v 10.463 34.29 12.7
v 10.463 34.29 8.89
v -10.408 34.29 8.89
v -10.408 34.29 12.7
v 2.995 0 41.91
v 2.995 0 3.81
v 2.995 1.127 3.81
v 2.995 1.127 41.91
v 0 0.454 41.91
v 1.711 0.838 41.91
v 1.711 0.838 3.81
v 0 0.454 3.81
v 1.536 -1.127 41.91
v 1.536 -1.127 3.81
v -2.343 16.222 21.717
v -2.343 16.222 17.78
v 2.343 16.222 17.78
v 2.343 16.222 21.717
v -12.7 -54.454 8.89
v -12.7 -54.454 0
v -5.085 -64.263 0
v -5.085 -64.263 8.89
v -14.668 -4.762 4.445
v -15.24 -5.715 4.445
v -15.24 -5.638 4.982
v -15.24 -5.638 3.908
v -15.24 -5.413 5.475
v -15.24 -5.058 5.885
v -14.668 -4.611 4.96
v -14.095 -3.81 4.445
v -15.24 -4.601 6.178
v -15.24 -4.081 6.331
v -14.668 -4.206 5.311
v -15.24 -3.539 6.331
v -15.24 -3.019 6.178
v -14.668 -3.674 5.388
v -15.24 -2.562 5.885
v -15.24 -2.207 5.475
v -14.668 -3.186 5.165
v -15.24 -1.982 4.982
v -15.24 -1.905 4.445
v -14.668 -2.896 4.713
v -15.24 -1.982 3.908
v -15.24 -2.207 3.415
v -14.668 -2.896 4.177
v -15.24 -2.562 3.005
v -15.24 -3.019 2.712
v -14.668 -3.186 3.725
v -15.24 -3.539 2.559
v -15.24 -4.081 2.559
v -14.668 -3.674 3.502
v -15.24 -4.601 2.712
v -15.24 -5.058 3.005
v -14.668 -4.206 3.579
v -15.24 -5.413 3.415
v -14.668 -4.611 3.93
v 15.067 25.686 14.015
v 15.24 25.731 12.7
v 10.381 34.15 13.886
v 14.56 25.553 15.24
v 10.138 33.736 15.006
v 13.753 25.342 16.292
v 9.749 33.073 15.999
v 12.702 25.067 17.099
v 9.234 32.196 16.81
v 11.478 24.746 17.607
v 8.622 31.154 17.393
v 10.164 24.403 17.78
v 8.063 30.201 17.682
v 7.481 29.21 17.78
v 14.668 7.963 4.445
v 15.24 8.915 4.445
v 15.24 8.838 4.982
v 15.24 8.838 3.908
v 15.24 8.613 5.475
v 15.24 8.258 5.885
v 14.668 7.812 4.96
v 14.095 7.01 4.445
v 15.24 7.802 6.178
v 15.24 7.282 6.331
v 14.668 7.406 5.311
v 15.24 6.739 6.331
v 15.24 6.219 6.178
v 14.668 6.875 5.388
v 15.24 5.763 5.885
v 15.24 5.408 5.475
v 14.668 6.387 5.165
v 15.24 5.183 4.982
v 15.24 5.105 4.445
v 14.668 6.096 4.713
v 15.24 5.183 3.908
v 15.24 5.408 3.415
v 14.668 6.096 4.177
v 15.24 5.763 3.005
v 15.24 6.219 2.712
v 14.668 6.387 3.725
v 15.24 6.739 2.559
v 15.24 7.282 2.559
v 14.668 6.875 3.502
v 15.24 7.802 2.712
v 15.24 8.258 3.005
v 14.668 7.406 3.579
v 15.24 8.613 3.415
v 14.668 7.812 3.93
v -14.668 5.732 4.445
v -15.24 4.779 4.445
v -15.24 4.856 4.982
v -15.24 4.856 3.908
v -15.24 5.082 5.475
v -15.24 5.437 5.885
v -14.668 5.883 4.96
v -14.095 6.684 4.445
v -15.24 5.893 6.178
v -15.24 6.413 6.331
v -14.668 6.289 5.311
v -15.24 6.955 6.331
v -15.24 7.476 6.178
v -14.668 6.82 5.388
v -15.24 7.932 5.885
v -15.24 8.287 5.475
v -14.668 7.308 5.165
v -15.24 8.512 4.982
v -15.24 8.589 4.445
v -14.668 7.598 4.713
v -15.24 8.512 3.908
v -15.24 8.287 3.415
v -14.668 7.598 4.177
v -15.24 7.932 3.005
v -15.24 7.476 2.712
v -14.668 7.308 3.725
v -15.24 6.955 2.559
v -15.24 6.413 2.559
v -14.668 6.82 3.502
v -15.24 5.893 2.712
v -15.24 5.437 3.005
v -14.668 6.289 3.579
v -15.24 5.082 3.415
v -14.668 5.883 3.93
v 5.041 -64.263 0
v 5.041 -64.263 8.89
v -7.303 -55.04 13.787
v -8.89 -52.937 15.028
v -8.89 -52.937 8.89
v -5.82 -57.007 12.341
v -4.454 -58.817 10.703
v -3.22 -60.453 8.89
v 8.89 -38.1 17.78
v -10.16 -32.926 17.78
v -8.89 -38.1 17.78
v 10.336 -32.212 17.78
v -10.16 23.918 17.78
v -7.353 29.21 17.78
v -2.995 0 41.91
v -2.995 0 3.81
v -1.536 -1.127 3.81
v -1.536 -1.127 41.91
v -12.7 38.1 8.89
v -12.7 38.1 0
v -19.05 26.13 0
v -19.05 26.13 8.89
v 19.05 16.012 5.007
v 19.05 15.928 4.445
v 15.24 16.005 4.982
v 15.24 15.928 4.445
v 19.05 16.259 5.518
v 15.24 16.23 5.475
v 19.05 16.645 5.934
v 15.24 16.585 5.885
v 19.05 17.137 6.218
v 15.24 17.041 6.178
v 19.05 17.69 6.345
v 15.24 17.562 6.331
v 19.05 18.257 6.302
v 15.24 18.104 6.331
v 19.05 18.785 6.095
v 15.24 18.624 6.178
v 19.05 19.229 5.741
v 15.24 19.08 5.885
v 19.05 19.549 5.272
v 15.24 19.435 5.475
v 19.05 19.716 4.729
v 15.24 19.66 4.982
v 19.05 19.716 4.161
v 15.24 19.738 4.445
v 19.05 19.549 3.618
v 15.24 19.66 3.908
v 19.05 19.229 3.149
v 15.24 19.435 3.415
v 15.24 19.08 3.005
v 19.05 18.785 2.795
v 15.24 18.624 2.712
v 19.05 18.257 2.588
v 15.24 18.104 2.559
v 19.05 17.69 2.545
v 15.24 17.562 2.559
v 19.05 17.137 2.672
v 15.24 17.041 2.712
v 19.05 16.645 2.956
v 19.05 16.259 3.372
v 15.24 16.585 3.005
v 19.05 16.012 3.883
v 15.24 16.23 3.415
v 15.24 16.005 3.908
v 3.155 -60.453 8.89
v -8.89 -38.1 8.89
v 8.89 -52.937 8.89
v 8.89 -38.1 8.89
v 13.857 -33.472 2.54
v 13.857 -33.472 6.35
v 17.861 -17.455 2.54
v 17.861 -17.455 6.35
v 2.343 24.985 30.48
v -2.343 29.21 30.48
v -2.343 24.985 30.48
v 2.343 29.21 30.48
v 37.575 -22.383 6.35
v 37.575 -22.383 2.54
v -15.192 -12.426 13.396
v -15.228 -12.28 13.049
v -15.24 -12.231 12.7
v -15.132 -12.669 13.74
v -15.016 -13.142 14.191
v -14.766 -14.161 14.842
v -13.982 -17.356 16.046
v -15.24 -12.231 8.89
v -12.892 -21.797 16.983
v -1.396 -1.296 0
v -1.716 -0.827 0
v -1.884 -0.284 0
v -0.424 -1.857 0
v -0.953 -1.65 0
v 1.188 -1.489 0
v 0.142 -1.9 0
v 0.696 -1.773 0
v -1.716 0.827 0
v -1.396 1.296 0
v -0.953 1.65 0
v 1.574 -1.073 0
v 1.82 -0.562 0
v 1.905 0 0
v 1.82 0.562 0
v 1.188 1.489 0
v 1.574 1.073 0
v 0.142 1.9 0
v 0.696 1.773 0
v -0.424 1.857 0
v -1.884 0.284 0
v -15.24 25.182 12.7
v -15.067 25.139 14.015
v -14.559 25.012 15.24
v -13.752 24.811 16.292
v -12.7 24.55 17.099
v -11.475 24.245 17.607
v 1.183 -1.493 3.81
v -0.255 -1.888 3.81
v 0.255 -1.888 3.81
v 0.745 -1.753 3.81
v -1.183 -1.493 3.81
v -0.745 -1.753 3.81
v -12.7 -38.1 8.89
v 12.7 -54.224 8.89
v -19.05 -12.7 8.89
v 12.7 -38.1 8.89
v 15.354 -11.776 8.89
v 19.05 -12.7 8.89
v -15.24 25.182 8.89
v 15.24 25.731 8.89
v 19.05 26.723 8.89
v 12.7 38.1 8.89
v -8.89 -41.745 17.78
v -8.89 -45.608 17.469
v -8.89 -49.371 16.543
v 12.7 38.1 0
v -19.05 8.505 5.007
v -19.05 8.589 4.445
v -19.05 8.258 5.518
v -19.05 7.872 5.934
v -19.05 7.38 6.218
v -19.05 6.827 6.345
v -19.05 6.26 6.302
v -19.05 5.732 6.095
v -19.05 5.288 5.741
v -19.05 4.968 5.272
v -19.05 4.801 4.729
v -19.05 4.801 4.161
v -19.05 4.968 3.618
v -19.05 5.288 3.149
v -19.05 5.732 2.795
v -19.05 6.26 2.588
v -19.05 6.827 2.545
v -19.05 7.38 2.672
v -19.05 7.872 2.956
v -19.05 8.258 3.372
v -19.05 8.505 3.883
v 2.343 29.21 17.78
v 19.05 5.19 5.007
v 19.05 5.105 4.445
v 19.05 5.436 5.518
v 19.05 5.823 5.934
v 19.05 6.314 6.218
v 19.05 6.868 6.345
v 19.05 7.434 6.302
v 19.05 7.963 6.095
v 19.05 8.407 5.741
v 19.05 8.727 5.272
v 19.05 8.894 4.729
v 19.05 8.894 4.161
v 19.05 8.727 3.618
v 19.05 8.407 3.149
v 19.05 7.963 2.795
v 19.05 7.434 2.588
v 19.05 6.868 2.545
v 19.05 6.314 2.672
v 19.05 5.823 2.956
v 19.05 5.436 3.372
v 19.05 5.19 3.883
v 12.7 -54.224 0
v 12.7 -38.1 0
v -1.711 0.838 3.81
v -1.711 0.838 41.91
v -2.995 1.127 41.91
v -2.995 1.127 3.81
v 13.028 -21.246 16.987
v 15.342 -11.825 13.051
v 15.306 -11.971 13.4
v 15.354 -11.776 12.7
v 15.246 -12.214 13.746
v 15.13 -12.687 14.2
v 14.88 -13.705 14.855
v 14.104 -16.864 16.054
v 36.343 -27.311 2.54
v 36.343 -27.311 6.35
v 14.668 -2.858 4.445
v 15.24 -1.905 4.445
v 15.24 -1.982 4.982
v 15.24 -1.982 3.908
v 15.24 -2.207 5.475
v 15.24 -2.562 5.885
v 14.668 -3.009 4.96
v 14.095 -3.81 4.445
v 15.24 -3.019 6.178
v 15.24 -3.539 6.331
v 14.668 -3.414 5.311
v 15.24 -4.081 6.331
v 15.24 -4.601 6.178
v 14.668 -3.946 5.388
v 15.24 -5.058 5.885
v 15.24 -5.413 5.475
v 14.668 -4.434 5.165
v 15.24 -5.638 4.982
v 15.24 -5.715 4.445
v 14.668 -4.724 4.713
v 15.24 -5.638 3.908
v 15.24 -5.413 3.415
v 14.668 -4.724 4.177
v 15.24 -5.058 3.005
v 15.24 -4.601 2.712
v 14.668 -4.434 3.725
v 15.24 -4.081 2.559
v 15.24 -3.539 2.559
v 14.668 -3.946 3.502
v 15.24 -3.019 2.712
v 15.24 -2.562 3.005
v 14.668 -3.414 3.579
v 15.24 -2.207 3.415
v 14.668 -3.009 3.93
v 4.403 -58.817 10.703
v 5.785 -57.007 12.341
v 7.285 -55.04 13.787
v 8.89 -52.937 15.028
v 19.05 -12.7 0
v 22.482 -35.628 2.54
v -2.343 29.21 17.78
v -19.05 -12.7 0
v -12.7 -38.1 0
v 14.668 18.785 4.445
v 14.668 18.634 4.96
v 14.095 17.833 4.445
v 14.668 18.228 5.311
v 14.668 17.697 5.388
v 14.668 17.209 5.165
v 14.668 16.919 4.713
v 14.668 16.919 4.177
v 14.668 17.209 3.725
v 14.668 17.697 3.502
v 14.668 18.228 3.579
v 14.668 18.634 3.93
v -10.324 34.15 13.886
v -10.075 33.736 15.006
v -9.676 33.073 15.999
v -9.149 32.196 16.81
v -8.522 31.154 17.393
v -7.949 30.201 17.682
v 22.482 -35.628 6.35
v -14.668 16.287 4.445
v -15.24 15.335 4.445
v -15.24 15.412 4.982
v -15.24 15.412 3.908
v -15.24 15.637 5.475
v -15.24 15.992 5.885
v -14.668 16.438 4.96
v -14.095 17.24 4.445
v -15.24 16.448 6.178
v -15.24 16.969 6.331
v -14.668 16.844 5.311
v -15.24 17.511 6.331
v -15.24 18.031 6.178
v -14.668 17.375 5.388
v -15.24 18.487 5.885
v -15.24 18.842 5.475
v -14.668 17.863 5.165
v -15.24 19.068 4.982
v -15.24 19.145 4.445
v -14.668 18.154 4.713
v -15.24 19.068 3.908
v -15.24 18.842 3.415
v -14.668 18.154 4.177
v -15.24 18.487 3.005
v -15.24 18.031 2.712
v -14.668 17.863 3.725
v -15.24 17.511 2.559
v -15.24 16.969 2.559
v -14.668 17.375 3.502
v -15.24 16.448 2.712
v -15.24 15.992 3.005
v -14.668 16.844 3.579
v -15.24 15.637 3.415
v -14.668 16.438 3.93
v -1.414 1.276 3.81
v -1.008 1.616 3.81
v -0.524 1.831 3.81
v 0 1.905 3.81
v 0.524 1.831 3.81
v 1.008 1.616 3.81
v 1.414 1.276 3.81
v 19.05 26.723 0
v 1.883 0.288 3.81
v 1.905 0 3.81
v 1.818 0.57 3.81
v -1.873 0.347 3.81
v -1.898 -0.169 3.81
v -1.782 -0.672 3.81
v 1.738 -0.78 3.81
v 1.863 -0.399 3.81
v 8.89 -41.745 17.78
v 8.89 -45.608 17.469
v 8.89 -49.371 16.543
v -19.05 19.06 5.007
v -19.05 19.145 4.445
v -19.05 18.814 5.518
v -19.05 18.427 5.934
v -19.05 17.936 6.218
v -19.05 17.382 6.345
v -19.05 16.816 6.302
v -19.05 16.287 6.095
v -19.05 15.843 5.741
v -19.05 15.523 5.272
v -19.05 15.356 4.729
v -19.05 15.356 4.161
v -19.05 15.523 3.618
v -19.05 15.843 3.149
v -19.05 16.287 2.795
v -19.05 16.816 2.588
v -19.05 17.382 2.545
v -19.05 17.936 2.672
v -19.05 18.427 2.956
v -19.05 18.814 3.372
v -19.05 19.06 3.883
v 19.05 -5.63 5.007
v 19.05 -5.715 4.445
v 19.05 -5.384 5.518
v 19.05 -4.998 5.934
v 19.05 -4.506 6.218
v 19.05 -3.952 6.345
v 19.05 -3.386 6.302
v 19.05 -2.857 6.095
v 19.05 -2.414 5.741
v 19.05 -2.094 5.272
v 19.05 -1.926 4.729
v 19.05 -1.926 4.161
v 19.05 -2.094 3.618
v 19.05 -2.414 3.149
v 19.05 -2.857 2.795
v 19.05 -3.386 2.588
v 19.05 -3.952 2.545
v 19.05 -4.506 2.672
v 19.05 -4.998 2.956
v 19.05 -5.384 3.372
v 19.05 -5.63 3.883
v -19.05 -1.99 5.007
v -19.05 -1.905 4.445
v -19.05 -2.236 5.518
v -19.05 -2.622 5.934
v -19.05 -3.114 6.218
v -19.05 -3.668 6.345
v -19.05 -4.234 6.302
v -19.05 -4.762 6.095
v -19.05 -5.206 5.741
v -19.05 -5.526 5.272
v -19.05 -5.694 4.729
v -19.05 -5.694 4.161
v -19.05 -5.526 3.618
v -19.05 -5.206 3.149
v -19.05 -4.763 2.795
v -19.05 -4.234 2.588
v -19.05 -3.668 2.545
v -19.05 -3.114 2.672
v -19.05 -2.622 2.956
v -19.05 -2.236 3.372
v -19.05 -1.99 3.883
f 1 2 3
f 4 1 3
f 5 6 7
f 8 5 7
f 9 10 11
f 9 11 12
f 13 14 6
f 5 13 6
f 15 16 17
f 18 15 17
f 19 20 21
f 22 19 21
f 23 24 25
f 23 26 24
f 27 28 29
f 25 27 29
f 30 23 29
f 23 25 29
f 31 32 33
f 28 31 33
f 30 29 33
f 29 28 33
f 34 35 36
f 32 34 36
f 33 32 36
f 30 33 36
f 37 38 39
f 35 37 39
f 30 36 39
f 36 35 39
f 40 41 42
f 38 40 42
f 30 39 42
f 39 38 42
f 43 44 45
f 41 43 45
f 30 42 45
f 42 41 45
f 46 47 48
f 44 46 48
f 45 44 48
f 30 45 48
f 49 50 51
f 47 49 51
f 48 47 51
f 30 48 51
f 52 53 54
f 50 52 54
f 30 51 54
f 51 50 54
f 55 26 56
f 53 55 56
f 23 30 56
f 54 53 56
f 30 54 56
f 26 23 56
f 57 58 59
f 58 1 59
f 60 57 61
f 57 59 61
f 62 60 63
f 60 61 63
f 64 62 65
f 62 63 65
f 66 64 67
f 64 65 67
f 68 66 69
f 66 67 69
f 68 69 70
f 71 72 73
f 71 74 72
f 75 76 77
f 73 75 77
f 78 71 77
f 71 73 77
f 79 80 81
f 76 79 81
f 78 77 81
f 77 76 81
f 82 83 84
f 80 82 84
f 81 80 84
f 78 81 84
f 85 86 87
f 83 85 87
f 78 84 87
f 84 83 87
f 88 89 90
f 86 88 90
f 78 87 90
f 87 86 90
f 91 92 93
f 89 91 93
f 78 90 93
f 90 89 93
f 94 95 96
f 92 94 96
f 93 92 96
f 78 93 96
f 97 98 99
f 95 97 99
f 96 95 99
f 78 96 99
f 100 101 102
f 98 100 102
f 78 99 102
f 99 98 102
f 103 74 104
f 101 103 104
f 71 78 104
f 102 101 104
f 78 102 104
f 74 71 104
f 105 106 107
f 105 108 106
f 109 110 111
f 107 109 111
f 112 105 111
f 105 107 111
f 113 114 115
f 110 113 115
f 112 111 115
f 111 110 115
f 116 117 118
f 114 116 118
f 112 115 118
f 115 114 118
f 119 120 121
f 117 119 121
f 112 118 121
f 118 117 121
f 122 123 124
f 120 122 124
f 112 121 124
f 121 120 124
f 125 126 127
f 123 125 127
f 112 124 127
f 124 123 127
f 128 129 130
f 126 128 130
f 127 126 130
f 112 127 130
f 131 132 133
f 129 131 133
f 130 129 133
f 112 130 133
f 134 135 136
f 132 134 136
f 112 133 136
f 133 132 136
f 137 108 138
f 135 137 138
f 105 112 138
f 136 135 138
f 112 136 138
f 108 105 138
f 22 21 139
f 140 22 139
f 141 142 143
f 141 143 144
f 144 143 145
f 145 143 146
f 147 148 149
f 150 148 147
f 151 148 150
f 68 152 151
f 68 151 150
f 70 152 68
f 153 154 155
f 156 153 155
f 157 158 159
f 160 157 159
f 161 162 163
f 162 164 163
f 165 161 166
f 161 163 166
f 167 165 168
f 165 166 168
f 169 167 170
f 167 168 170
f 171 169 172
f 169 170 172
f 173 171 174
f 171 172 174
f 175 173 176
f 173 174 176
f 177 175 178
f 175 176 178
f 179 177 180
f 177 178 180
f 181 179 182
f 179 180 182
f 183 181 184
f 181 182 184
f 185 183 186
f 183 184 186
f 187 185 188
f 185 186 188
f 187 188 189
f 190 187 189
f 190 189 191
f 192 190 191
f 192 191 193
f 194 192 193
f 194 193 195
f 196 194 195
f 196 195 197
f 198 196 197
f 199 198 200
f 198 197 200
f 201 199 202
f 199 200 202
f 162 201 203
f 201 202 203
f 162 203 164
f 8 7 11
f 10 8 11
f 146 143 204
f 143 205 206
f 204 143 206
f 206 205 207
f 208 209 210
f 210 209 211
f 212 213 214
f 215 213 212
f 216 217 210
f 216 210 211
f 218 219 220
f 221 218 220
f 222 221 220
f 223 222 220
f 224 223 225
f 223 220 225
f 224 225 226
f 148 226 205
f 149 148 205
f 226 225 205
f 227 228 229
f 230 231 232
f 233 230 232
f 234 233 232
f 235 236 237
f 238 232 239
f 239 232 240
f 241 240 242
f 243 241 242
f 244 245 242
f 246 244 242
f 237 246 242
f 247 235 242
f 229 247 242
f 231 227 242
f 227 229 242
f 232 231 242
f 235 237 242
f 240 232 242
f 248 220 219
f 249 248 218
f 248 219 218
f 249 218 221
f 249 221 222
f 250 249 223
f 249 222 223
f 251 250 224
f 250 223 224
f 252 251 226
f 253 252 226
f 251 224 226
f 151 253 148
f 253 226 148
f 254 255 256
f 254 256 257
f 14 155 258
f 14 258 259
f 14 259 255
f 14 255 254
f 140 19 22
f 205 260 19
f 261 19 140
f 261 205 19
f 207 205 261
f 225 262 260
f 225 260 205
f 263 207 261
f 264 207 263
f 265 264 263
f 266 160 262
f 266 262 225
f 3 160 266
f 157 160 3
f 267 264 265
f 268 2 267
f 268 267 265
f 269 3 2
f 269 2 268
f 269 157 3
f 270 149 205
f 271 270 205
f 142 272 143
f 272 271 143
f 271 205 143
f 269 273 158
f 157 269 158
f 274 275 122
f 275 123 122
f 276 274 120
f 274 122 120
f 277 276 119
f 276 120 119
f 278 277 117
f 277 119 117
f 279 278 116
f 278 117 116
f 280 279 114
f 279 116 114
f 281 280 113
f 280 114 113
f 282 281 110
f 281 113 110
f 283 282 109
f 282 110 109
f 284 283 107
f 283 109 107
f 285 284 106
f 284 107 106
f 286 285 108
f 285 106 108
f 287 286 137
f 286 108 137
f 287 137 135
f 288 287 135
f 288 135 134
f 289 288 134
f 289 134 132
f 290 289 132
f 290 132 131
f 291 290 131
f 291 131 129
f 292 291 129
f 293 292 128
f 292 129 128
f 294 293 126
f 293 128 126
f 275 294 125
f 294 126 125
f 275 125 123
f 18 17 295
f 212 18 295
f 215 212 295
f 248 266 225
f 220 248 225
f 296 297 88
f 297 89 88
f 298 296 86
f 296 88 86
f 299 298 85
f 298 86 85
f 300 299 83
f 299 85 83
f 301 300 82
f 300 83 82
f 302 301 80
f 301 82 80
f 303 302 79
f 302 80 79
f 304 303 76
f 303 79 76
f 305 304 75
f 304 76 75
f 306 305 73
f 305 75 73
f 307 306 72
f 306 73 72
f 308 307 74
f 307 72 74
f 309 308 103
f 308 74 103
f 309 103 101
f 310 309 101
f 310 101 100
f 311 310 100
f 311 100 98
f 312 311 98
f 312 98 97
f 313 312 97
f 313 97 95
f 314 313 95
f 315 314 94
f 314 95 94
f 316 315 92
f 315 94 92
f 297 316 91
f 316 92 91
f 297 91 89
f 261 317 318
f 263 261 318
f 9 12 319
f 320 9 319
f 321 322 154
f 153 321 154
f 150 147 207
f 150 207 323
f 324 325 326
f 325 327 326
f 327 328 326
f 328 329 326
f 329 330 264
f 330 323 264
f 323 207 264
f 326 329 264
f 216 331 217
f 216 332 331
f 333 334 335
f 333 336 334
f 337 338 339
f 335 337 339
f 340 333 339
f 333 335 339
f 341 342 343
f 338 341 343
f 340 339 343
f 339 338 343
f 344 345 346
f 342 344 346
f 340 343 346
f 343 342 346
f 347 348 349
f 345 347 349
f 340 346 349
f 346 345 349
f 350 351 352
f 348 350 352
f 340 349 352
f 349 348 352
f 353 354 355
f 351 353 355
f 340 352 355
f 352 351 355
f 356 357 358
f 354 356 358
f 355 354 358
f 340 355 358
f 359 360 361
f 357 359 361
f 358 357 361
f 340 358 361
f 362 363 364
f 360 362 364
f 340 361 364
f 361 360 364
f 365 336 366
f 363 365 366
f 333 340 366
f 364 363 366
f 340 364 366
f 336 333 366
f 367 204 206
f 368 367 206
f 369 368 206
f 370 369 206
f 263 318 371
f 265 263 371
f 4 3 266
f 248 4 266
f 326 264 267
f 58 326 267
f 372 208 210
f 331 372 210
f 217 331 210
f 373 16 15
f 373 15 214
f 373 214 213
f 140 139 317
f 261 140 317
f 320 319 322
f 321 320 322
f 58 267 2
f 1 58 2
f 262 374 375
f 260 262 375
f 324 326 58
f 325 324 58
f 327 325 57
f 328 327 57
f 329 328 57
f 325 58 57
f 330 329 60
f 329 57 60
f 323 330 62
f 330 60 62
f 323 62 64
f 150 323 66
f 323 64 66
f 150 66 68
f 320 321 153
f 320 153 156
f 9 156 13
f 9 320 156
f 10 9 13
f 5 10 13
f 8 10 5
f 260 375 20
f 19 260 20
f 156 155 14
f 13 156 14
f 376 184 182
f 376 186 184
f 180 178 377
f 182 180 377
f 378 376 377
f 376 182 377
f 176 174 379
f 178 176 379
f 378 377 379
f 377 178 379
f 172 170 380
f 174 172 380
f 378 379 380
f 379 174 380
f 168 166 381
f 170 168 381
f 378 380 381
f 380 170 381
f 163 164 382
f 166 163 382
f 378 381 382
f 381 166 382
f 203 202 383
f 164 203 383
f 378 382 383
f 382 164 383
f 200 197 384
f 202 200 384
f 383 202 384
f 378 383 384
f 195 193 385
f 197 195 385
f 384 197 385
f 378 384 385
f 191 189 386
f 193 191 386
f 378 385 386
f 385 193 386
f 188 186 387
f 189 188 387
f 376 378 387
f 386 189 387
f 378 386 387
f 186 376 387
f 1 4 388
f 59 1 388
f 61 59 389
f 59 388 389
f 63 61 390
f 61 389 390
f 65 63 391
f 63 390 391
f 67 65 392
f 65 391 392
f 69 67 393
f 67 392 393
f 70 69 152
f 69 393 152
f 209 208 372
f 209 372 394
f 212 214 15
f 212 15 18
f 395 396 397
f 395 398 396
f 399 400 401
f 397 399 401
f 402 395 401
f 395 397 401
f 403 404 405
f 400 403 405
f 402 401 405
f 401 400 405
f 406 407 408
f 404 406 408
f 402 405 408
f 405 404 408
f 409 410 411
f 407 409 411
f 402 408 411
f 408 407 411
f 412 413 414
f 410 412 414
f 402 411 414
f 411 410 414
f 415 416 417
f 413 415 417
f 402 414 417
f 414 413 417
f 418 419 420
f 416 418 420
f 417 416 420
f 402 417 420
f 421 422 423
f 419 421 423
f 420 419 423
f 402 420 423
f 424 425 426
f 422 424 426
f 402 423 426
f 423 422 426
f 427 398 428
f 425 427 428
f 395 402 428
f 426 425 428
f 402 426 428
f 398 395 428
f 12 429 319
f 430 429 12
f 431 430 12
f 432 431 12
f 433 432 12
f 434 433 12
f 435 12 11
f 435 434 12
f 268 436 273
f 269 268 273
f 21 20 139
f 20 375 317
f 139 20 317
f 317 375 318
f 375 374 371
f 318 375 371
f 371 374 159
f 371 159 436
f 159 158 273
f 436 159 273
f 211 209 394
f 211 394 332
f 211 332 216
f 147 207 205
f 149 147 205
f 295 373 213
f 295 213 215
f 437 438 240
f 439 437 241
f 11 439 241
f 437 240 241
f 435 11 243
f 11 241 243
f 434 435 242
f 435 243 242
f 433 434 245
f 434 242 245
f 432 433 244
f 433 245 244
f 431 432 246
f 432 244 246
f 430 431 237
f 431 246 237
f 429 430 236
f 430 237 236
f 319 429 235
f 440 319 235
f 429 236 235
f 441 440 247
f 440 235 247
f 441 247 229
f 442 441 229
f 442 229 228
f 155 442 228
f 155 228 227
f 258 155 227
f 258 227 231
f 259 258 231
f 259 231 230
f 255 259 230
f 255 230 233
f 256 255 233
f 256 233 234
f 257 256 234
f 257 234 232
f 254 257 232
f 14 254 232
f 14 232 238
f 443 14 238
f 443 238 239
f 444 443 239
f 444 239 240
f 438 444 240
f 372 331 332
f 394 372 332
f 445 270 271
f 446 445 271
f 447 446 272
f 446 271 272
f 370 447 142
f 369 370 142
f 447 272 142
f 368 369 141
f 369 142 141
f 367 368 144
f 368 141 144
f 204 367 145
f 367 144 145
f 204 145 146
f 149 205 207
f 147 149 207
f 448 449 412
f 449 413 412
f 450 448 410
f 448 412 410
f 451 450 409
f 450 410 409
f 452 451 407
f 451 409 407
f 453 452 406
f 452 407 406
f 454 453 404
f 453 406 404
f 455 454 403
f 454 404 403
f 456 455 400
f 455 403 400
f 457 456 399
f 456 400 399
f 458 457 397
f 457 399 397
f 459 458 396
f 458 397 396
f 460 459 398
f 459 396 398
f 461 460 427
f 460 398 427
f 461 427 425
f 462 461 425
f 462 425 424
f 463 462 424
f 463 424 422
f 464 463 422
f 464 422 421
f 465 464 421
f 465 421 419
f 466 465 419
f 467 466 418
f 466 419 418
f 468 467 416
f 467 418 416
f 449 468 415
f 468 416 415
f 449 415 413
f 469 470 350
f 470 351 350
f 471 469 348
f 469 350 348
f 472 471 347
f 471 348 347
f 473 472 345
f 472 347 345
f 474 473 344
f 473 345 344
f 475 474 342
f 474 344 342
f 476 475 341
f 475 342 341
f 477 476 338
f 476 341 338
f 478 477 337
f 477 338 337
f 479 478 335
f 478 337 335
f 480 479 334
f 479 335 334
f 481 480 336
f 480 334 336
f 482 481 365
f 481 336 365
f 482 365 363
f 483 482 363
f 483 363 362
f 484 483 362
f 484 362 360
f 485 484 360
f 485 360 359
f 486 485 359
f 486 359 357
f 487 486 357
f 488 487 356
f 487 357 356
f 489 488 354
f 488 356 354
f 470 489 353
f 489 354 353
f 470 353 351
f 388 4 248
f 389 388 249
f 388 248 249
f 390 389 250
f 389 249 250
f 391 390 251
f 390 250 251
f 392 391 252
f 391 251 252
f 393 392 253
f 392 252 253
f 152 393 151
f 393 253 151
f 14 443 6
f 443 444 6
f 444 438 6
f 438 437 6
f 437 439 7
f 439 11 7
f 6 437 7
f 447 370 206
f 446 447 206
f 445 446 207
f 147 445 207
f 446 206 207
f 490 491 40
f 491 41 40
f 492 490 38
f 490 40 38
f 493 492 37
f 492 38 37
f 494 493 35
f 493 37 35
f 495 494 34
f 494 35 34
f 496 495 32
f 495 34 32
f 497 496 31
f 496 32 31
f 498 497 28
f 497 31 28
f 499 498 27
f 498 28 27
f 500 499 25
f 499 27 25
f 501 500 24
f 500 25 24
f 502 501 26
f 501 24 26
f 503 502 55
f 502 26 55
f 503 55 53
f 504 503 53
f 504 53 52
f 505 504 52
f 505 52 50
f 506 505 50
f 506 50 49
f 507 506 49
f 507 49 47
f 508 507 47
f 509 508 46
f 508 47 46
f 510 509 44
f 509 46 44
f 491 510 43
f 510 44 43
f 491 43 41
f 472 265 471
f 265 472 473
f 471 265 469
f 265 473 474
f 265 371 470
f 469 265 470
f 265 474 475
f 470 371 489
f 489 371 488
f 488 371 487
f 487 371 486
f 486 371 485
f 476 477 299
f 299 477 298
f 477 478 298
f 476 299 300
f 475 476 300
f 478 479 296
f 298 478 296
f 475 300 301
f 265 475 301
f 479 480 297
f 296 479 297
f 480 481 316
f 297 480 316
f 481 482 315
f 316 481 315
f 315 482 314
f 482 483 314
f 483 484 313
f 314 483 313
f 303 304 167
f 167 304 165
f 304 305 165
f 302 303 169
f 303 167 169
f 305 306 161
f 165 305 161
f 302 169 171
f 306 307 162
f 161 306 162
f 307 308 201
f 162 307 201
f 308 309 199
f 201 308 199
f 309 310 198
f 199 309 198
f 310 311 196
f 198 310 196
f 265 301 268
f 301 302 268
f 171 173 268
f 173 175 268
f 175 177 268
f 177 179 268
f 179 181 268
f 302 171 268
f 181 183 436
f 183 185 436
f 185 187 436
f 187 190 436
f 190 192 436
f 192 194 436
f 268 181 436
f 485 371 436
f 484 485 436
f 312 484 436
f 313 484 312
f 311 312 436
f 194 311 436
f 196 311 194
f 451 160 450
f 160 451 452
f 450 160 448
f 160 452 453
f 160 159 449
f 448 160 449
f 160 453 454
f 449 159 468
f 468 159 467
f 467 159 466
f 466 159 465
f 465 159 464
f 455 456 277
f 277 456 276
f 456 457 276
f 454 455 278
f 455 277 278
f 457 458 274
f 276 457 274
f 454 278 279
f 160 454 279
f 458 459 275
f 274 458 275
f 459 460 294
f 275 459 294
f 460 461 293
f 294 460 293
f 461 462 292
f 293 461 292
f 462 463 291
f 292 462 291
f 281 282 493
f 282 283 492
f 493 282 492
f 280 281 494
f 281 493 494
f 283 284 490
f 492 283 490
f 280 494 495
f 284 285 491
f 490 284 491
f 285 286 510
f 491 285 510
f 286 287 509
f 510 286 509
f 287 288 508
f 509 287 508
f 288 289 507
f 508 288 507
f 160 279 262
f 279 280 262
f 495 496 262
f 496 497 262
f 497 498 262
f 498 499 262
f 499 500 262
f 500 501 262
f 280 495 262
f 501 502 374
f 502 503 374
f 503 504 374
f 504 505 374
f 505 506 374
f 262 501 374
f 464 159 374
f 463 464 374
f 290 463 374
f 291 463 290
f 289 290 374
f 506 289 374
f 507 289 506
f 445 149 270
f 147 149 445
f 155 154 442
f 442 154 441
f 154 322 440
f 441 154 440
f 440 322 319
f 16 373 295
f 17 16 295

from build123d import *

# Parameters (mm, degrees)
F1_DEPTH    = 8.89
F3_DEPTH    = 8.89
F4_T1_DEPTH = 99.9162053314
F5_DEPTH    = 8.89
F6_R        = 5.08
F8_D        = 3.81
F8_DEPTH    = 3.81
F8_TIP      = 1.1446394792
F10_D       = 3.81
F10_DEPTH   = 3.81
F10_TIP     = 1.1446394792
F11_R       = 1.905
F12_DEPTH   = 3.81
F14_DEPTH   = 38.1
F15_DEPTH   = 38.1
F16_DEPTH   = 38.1
F17_W       = 4.6861195005
F17_H       = 12.987878806
F18_DEPTH   = 12.7
F19_SIZE    = 8.763
F20_W       = 16.51
F20_H       = 3.81
F21_DEPTH   = 20.32
F22_SIZE    = 11.43


# Not quite as in the source:
# - a fillet or chamfer that OpenCascade refuses, or shapes differently, is made with other operations: its cross-section is extruded or revolved along the edge and cut away or added


with BuildPart() as f1:
    # F0 (on Top) → F1 (new body)
    with BuildSketch(Plane.XY):
        Polygon((19.05, 26.7226453871), (12.7, 38.1), (-12.7, 38.1), (-19.05, 26.1296909302), (-19.05, -12.7), (-12.7, -38.1), (-12.7, -54.4537100359), (-5.0853045448, -64.2633512616), (5.0406523641, -64.2633512616), (12.7, -54.2242169015), (12.7, -38.1), (19.05, -12.7), align=None)
    extrude(amount=F1_DEPTH)

    # F2 (on face) → F5 (join)
    with BuildSketch(Plane.XY.offset(8.89)):
        Polygon((-15.24, -12.2309675664), (-8.89, -38.1), (8.89, -38.1), (15.3537570744, -11.7759392686), (15.24, 25.7313851458), (10.4632125856, 34.29), (-10.4082323758, 34.29), (-15.24, 25.1816926275), align=None)
    extrude(amount=F5_DEPTH)

    # F6
    f6_edges = [f1.edges().sort_by_distance(p)[0] for p in [
        (-15.24, 6.475363, 17.78),
        (15.296879, 6.977723, 17.78),
        (-12.824116, 29.735846, 17.78),
        (12.851606, 30.010693, 17.78),
        (0.02749, 34.29, 17.78),
    ]]
    fillet(f6_edges, radius=F6_R)

    # F8
    with Locations(Plane.YZ.offset(19.05)):
        with Locations((-3.81, 4.445), (7.0104, 4.445), (17.8326453871, 4.445)):
            Hole(F8_D / 2, depth=F8_DEPTH)
            with Locations((0, 0, -(F8_DEPTH + F8_TIP / 2))):  # 118° drill point
                Cone(0, F8_D / 2, F8_TIP, mode=Mode.SUBTRACT)

    # F10
    with Locations(Plane(origin=(-19.05, 0, 0), x_dir=(0, -1, 0), z_dir=(-1, 0, 0))):
        with Locations((-17.2396909302, 4.445), (-6.684313026, 4.445), (3.81, 4.445)):
            Hole(F10_D / 2, depth=F10_DEPTH)
            with Locations((0, 0, -(F10_DEPTH + F10_TIP / 2))):  # 118° drill point
                Cone(0, F10_D / 2, F10_TIP, mode=Mode.SUBTRACT)


with BuildPart() as f3:
    # F2 (on face) → F3 (new body)
    with BuildSketch(Plane.XY.offset(8.89)):
        Polygon((8.89, -38.1), (-8.89, -38.1), (-8.89, -52.936759997), (-3.2196400783, -60.4533512616), (-0.0223260903, -60.4533512616), (3.1552241252, -60.4533512616), (8.89, -52.936759997), align=None)
    extrude(amount=F3_DEPTH)

    # F4: fillet of radius 24.13 on 1 edges, made by hand

    # F4_s2 → F4_t1 (cut)
    with BuildSketch(Plane.YZ.offset(-49.9903106423)):
        with BuildLine():
            ThreePointArc((-41.745083036, 17.78), (-52.1016196193, 15.4444729232), (-60.4533512616, 8.89))
            Line((-60.4533512616, 8.89), (-60.4533512616, 17.78))
            Line((-60.4533512616, 17.78), (-41.745083036, 17.78))
        make_face()
    extrude(amount=F4_T1_DEPTH, mode=Mode.SUBTRACT)


with BuildPart() as f12:
    # F11 (on Top) → F12 (new body)
    with BuildSketch(Plane.XY):
        Circle(F11_R)
    extrude(amount=F12_DEPTH)

    # F13 (on face) → F14 (join)
    with BuildSketch(Plane.XY.offset(3.81)):
        with BuildLine():
            Line((0, -1.1266035726), (1.5361606004, -1.1266035726))
            ThreePointArc((1.5361606004, -1.1266035726), (1.8104434462, -0.592722134), (1.905, 0))
            ThreePointArc((1.905, 0), (1.8558119687, 0.4301010776), (1.7107879927, 0.837991315))
            Line((1.7107879927, 0.837991315), (0, 0.4536258639))
            Line((0, 0.4536258639), (-1.7107879927, 0.837991315))
            ThreePointArc((-1.7107879927, 0.837991315), (-1.8975186586, -0.1686651723), (-1.5361606004, -1.1266035726))
            Line((-1.5361606004, -1.1266035726), (0, -1.1266035726))
        make_face()
    extrude(amount=F14_DEPTH)

    # F13 (on face) → F15 (join)
    with BuildSketch(Plane.XY.offset(3.81)):
        with BuildLine():
            Line((-2.9953841586, 0), (-1.5361606004, -1.1266035726))
            ThreePointArc((-1.5361606004, -1.1266035726), (-1.8975186586, -0.1686651723), (-1.7107879927, 0.837991315))
            Line((-1.7107879927, 0.837991315), (-2.9953841586, 1.1266035726))
            Line((-2.9953841586, 1.1266035726), (-2.9953841586, 0))
        make_face()
    extrude(amount=F15_DEPTH)

    # F13 (on face) → F16 (join)
    with BuildSketch(Plane.XY.offset(3.81)):
        with BuildLine():
            ThreePointArc((1.905, 0), (1.8104434462, -0.592722134), (1.5361606004, -1.1266035726))
            Line((1.5361606004, -1.1266035726), (2.9953841586, 0))
            Line((2.9953841586, 0), (2.9953841586, 1.1266035726))
            Line((2.9953841586, 1.1266035726), (1.7107879927, 0.837991315))
            ThreePointArc((1.7107879927, 0.837991315), (1.8558119687, 0.4301010776), (1.905, 0))
        make_face()
    extrude(amount=F16_DEPTH)


with BuildPart() as f18:
    # F17 (on face) → F18 (new body)
    with BuildSketch(Plane.XY.offset(17.78)):
        with Locations((0, 22.716060597)):
            Rectangle(F17_W, F17_H)
    extrude(amount=F18_DEPTH)

    # F19
    f19_edges = [f18.edges().sort_by_distance(p)[0] for p in [
        (0, 16.222121, 30.48),
    ]]
    chamfer(f19_edges, length=F19_SIZE)


with BuildPart() as f21:
    # F20 (on face) → F21 (new body)
    with BuildSketch(Plane(origin=(20.9176470588, -5.2294117647, 0), x_dir=(0.242535625, 0.9701425001, 0), z_dir=(0.9701425001, -0.242535625, 0))):
        with Locations((-20.8566915244, 4.445)):
            Rectangle(F20_W, F20_H)
    extrude(amount=F21_DEPTH)

    # F22
    f22_edges = [f21.edges().sort_by_distance(p)[0] for p in [
        (33.57032, -38.400225, 4.445),
    ]]
    chamfer(f22_edges, length=F22_SIZE)


solid = Compound([f1.part, f3.part, f12.part, f18.part, f21.part])
